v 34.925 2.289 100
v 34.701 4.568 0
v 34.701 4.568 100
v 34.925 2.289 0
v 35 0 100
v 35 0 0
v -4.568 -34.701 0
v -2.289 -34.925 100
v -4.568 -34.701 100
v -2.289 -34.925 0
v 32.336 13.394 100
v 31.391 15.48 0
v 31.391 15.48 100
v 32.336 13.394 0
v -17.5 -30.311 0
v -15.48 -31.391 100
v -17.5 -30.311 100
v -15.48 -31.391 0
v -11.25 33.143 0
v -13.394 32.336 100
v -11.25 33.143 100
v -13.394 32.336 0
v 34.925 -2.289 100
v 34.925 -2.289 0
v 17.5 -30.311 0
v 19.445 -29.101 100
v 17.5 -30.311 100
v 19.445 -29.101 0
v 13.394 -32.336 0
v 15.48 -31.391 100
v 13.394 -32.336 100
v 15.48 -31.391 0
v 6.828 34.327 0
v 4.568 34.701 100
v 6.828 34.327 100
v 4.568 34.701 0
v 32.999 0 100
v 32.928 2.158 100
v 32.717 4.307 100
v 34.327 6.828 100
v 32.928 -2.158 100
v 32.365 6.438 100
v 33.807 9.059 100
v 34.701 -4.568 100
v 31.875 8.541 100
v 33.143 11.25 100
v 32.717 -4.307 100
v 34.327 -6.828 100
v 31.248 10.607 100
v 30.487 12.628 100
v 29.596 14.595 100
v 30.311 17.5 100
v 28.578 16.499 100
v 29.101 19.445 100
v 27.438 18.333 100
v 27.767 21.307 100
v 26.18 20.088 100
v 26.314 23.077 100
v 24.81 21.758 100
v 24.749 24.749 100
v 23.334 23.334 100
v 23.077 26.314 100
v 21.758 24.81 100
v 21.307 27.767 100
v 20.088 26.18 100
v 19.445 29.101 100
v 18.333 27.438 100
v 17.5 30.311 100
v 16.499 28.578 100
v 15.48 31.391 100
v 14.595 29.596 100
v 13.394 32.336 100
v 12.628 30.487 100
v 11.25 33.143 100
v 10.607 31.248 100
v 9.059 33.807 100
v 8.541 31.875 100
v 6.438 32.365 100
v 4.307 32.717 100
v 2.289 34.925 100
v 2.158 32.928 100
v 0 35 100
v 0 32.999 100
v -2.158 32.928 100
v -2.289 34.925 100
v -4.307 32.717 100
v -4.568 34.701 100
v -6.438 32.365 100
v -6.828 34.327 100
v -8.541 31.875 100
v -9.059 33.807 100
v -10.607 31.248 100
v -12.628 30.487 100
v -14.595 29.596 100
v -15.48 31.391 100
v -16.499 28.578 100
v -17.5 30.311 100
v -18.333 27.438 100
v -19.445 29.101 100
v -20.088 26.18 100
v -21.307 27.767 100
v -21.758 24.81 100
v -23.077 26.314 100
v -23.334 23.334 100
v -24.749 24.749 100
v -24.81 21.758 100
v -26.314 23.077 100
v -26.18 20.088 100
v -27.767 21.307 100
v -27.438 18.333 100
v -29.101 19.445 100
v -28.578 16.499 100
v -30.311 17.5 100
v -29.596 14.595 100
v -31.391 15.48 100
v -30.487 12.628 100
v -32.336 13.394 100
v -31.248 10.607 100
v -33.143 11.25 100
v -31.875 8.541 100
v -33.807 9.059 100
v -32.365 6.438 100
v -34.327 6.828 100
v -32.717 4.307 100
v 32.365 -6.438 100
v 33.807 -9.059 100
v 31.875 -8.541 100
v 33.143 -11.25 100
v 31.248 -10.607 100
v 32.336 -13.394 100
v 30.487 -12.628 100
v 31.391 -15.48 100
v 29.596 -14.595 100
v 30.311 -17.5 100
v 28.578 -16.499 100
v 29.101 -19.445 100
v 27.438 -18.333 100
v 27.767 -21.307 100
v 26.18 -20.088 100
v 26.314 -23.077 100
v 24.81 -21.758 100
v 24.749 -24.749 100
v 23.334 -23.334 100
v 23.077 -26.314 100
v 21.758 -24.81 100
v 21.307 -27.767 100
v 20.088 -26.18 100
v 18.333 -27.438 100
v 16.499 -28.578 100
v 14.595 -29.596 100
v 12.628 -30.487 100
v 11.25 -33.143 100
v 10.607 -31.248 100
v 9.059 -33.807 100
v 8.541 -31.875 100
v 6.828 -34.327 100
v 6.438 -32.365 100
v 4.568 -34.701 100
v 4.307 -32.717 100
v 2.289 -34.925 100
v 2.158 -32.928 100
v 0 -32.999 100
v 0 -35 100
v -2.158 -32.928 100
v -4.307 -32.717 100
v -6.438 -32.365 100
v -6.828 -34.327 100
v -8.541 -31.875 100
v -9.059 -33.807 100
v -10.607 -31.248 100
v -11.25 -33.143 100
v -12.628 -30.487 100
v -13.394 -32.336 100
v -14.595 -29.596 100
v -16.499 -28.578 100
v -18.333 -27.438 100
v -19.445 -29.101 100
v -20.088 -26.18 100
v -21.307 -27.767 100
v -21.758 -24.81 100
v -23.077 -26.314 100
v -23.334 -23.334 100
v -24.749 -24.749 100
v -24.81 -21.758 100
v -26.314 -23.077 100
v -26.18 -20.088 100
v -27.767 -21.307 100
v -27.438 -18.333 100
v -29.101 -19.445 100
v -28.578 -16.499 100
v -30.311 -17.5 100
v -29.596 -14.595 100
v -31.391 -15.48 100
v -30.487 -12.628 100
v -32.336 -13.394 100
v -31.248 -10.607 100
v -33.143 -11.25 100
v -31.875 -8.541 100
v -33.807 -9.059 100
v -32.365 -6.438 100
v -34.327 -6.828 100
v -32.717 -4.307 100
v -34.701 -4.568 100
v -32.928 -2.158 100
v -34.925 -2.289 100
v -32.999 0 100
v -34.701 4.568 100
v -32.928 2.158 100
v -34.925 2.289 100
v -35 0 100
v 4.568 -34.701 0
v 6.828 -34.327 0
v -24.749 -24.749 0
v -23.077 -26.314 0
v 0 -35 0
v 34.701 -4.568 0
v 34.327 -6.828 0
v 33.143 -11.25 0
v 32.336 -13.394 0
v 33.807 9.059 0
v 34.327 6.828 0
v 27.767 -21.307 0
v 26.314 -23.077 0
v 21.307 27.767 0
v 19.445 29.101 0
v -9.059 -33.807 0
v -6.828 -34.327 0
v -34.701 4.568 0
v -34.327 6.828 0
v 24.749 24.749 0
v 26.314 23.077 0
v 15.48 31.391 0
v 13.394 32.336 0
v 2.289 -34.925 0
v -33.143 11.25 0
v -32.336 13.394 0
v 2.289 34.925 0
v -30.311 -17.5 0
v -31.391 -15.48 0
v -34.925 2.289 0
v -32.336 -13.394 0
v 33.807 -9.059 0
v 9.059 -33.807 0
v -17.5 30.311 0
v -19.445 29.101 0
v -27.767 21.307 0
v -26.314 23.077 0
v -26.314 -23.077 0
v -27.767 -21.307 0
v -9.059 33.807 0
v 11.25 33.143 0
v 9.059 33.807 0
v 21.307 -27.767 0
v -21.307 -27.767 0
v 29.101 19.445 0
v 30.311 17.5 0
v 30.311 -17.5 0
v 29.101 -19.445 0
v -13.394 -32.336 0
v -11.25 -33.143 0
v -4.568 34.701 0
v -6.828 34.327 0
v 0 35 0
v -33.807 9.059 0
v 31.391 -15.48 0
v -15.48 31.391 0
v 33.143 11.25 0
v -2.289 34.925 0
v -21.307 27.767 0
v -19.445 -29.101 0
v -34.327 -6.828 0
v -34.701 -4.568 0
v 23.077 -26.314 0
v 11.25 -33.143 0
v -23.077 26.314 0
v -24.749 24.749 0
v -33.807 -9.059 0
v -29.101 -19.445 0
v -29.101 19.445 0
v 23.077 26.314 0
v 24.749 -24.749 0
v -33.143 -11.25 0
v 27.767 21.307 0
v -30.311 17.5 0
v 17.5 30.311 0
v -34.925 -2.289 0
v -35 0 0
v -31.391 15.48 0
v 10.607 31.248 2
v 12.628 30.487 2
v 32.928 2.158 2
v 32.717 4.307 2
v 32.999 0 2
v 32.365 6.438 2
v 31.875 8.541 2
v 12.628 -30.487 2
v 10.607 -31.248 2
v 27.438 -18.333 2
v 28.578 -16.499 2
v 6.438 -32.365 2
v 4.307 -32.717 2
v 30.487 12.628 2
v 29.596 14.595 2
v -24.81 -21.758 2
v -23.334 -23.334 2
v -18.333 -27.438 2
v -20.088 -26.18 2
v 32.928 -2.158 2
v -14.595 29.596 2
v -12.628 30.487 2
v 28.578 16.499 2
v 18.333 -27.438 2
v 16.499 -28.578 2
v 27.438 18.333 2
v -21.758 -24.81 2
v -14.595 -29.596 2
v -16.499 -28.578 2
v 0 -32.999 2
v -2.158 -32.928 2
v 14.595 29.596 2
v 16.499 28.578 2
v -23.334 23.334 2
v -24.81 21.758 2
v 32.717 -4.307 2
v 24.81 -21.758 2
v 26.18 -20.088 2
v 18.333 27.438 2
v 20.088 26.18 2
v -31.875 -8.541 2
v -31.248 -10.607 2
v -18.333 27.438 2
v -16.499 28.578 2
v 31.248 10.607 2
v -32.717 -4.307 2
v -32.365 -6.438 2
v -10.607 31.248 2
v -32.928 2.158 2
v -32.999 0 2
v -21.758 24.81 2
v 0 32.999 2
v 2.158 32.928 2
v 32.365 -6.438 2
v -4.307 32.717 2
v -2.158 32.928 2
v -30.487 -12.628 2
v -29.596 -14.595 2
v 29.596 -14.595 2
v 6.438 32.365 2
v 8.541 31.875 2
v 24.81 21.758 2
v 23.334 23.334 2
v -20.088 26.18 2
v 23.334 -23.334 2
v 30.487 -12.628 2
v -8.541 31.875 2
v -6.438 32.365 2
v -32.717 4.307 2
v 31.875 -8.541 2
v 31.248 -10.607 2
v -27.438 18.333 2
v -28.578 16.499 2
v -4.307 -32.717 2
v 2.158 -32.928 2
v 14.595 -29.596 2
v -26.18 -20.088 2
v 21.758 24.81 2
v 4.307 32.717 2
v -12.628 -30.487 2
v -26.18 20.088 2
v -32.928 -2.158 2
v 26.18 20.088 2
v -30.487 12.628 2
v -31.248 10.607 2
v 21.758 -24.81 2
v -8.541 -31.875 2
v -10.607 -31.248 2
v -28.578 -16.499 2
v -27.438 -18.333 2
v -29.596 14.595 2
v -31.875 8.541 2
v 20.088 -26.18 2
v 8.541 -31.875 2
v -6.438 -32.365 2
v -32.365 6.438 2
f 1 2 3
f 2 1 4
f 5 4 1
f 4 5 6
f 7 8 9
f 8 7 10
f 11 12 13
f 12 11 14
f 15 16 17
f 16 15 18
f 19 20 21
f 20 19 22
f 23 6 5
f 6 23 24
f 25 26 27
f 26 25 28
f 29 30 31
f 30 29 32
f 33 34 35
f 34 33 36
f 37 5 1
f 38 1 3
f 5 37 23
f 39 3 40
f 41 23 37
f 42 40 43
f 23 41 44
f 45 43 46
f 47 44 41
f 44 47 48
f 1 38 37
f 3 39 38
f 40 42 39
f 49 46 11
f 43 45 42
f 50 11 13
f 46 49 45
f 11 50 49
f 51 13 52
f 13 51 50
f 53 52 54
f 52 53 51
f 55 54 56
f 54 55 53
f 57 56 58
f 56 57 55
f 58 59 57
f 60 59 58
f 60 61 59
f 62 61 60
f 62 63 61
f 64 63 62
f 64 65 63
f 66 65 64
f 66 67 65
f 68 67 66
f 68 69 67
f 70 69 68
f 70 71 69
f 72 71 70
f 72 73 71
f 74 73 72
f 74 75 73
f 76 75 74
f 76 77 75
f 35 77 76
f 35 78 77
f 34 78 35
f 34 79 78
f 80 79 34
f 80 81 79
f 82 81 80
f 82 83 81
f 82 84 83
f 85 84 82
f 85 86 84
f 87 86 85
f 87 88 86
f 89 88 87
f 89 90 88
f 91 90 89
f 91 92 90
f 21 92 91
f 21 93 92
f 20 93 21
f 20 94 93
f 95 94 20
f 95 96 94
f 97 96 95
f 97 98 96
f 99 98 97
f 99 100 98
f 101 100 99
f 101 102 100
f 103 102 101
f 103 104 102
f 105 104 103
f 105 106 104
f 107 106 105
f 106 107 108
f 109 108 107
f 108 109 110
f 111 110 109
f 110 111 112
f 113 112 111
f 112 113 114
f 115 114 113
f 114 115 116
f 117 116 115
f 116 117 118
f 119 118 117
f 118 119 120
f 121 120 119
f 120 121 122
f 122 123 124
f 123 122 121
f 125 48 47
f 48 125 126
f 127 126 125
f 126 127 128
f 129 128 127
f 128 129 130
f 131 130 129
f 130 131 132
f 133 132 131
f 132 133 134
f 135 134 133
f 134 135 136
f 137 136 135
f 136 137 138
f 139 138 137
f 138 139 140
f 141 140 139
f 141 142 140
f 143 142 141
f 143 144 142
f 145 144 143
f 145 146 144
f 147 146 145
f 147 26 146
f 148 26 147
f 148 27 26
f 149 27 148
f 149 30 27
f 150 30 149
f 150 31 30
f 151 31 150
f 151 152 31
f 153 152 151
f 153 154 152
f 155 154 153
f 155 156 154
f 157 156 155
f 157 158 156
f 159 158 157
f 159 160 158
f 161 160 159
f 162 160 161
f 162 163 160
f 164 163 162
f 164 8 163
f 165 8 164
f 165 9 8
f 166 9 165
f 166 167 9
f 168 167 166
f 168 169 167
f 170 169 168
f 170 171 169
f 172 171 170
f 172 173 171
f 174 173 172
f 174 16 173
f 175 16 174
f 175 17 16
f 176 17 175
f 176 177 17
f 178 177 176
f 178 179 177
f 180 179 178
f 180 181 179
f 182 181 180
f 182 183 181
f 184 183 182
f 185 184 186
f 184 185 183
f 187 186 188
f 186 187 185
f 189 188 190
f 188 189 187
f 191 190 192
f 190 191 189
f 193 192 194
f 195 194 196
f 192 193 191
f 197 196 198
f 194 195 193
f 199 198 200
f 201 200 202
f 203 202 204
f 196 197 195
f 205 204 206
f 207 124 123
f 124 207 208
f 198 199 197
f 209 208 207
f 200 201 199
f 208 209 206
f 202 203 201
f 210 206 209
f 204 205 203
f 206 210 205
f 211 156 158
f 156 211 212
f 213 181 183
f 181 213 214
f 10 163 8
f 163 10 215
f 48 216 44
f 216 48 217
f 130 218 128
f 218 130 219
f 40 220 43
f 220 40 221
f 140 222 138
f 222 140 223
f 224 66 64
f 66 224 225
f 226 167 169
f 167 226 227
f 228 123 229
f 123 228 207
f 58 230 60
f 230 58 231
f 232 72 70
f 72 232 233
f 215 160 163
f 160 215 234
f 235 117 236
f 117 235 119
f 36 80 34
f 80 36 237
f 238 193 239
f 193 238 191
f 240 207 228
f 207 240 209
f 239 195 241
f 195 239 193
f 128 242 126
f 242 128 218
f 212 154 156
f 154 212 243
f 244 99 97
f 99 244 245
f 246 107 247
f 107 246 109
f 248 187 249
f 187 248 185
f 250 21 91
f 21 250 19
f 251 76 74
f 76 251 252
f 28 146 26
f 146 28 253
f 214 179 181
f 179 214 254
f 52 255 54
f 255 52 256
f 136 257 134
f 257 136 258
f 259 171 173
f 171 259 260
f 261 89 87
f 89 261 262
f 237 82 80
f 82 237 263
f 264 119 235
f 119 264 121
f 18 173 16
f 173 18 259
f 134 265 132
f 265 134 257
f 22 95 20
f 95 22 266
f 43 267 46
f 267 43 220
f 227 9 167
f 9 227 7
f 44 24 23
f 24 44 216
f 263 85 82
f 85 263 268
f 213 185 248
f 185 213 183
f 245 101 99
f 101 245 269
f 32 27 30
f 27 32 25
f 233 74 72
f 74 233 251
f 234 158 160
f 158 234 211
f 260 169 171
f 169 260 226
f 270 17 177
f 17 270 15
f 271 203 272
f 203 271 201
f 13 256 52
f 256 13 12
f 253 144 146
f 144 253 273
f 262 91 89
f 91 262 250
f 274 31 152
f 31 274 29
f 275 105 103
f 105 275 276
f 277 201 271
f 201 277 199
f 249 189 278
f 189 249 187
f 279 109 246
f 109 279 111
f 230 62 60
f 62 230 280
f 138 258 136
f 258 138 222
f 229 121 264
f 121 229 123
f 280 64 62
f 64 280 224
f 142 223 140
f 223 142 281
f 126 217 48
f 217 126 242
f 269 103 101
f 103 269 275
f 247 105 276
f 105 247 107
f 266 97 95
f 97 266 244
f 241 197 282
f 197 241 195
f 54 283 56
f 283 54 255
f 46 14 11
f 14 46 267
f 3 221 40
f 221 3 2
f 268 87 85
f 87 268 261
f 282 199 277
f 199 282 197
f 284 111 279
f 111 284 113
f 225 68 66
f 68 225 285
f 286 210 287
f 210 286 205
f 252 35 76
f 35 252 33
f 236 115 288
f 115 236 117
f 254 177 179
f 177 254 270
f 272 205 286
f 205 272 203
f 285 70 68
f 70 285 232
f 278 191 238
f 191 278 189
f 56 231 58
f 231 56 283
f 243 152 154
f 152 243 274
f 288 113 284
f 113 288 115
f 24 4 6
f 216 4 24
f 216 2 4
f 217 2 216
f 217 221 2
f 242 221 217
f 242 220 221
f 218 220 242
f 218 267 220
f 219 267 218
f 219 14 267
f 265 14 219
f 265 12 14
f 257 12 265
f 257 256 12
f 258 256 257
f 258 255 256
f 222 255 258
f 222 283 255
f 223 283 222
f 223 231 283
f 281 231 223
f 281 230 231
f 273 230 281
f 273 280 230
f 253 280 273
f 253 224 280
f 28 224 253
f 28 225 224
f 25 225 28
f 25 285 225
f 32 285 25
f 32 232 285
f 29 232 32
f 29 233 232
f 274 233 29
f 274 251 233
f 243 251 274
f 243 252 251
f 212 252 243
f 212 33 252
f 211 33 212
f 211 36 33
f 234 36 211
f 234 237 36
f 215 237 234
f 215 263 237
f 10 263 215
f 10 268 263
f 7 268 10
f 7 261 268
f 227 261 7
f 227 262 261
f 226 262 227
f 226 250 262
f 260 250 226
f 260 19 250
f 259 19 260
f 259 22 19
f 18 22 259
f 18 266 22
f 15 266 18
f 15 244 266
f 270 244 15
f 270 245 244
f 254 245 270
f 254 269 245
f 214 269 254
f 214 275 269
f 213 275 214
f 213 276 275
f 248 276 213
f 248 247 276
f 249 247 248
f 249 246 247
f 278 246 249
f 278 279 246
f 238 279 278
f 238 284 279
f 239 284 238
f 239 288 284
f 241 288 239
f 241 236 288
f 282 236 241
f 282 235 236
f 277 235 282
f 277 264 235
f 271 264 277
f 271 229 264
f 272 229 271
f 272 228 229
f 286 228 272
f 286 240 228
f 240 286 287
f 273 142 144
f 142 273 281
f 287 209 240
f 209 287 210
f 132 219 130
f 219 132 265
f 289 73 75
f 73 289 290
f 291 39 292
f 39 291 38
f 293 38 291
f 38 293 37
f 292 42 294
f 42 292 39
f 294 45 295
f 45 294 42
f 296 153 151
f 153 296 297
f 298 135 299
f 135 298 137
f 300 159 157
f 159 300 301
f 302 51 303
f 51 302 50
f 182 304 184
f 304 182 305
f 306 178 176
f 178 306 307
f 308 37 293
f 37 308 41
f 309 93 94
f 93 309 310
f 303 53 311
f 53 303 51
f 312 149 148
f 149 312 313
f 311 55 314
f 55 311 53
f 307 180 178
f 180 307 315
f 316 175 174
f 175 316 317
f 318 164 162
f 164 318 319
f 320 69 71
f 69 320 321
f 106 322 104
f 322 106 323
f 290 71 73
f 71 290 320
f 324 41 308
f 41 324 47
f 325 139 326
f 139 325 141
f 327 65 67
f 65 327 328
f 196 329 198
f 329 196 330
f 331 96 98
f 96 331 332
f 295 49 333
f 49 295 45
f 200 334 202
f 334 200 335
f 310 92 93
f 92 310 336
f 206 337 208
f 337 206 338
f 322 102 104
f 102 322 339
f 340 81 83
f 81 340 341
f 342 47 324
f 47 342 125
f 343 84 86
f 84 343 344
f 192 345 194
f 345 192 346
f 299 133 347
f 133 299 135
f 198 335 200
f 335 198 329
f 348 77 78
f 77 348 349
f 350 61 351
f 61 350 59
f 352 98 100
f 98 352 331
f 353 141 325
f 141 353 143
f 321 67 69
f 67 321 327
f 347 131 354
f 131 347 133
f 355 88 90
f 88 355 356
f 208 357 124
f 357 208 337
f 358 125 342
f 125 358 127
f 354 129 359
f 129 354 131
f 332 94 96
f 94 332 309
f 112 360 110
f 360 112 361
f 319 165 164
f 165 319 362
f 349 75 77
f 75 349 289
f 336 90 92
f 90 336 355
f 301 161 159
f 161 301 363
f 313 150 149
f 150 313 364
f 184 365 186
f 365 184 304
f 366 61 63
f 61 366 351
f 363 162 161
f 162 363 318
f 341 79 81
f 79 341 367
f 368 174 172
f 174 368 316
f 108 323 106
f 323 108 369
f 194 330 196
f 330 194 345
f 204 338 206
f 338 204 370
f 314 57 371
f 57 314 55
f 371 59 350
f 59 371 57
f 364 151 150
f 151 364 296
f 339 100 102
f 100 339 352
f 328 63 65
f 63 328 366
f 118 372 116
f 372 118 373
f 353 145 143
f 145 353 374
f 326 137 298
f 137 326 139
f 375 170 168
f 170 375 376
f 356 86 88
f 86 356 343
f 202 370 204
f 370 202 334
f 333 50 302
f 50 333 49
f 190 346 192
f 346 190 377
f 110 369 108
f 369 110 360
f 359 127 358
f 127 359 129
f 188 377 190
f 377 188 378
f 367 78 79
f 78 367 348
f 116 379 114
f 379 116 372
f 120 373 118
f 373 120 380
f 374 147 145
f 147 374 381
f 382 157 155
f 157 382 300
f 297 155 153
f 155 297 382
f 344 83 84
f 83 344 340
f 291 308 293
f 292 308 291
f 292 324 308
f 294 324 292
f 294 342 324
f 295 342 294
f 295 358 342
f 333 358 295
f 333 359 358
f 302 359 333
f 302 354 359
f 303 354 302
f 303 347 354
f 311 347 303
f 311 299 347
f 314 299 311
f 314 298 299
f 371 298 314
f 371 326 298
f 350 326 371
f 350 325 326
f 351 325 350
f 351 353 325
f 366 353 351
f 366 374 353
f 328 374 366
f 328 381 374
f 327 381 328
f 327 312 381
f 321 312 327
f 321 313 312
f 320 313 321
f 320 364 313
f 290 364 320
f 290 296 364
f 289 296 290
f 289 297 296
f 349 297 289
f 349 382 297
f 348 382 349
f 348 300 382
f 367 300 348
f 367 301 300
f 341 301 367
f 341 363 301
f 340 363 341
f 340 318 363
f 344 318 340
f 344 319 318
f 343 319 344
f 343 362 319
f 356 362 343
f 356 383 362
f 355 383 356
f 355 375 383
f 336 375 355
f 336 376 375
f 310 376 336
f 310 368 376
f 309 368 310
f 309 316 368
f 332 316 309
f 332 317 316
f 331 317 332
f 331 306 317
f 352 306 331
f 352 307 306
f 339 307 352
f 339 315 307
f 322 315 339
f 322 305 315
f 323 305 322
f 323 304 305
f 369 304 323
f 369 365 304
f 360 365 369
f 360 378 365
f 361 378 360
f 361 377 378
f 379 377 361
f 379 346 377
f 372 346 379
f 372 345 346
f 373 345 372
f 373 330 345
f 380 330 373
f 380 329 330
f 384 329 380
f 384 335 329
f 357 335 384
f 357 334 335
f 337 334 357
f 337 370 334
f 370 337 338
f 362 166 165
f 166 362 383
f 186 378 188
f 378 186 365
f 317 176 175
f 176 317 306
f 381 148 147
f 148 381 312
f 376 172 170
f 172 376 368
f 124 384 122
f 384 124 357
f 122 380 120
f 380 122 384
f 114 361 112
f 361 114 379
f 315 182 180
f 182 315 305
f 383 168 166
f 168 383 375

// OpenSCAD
// Portapenne: cilindro o esagono con fondo pieno e divisori interni facoltativi.
forma = "cilindro";
diametro = 70;
altezza = 100;
pareti = 2;
scomparti = 1;    // 1 = nessun divisorio

fondo = 2;
lati = forma == "esagono" ? 6 : 96;

difference() {
    cylinder(d = diametro, h = altezza, $fn = lati);
    translate([0, 0, fondo]) cylinder(d = diametro - 2 * pareti / cos(180 / lati), h = altezza, $fn = lati);
}

if (scomparti > 1)
    intersection() {
        cylinder(d = diametro - pareti, h = altezza * 0.8, $fn = lati);
        for (i = [0 : scomparti - 1])
            rotate(i * 360 / scomparti) translate([0, -pareti / 2, 0]) cube([diametro / 2, pareti, altezza * 0.8]);
    }
